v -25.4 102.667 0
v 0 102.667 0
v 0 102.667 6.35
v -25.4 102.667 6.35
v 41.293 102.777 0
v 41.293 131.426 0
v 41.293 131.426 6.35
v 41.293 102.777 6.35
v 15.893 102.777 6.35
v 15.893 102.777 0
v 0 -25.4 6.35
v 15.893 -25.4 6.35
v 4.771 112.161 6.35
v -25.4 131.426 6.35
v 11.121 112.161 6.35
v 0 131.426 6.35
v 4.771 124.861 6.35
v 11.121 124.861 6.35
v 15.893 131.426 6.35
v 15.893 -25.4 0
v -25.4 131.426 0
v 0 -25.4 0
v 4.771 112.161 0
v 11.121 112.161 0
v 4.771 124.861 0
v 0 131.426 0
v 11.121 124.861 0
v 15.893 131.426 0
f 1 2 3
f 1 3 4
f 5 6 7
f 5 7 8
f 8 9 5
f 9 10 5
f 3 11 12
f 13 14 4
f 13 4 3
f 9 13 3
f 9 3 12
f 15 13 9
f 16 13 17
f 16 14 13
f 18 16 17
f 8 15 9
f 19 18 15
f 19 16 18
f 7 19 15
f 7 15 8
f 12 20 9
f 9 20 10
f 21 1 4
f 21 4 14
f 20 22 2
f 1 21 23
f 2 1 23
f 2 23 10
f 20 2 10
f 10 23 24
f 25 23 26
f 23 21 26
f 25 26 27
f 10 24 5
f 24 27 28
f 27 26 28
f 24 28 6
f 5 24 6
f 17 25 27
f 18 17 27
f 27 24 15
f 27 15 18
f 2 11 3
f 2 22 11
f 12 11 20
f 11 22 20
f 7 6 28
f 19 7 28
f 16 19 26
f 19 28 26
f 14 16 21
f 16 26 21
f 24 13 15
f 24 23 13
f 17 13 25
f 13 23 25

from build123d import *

# Parameters (mm, degrees)
F0_W      = 15.89278
F0_H      = 118.7259927564
F1_DEPTH  = 5.08
F2_W      = 15.9494206481
F2_H      = 5.08
F3_DEPTH  = 25.4
F4_W      = 16.0588771277
F4_H      = 5.08
F5_DEPTH  = 25.4
F6_DEPTH  = 12.7
F7_DEPTH  = 25.4
F8_W      = 6.35
F8_H      = 12.7
F9_DEPTH  = 25.4
F10_DEPTH = 1.27


with BuildPart() as f1:
    # F0 (on Top) → F1 (new body)
    with BuildSketch(Plane.XY):
        with Locations((7.94639, 59.3629963782)):
            Rectangle(F0_W, F0_H)
    extrude(amount=F1_DEPTH)

    # F2 (on face) → F3 (join)
    with BuildSketch(Plane.YZ.offset(15.89278)):
        with Locations((110.7512824323, 2.54)):
            Rectangle(F2_W, F2_H)
    extrude(amount=F3_DEPTH)

    # F4 (on face) → F5 (join)
    with BuildSketch(Plane(origin=(0, 0, 0), x_dir=(0, -1, 0), z_dir=(-1, 0, 0))):
        with Locations((-110.6965541926, 2.54)):
            Rectangle(F4_W, F4_H)
    extrude(amount=F5_DEPTH)

    # F6 (add): a face of the model
    f6_faces = [f1.faces().sort_by_distance(p)[0] for p in [
        (7.94639, 118.7259927564, 2.54),
    ]]
    extrude(f6_faces, amount=F6_DEPTH)

    # F7 (add): a face of the model
    f7_faces = [f1.faces().sort_by_distance(p)[0] for p in [
        (7.94639, 0, 2.54),
    ]]
    extrude(f7_faces, amount=F7_DEPTH)

    # F8 (on face) → F9 (cut)
    with BuildSketch(Plane.XY.offset(5.08)):
        with Locations((7.94639, 118.5111179948)):
            Rectangle(F8_W, F8_H)
    extrude(amount=-F9_DEPTH, mode=Mode.SUBTRACT)

    # F10 (add): a face of the model
    f10_faces = [f1.faces().sort_by_distance(p)[0] for p in [
        (7.9315574243, 75.7859315554, 5.08),
    ]]
    extrude(f10_faces, amount=F10_DEPTH)


solid = f1.part
